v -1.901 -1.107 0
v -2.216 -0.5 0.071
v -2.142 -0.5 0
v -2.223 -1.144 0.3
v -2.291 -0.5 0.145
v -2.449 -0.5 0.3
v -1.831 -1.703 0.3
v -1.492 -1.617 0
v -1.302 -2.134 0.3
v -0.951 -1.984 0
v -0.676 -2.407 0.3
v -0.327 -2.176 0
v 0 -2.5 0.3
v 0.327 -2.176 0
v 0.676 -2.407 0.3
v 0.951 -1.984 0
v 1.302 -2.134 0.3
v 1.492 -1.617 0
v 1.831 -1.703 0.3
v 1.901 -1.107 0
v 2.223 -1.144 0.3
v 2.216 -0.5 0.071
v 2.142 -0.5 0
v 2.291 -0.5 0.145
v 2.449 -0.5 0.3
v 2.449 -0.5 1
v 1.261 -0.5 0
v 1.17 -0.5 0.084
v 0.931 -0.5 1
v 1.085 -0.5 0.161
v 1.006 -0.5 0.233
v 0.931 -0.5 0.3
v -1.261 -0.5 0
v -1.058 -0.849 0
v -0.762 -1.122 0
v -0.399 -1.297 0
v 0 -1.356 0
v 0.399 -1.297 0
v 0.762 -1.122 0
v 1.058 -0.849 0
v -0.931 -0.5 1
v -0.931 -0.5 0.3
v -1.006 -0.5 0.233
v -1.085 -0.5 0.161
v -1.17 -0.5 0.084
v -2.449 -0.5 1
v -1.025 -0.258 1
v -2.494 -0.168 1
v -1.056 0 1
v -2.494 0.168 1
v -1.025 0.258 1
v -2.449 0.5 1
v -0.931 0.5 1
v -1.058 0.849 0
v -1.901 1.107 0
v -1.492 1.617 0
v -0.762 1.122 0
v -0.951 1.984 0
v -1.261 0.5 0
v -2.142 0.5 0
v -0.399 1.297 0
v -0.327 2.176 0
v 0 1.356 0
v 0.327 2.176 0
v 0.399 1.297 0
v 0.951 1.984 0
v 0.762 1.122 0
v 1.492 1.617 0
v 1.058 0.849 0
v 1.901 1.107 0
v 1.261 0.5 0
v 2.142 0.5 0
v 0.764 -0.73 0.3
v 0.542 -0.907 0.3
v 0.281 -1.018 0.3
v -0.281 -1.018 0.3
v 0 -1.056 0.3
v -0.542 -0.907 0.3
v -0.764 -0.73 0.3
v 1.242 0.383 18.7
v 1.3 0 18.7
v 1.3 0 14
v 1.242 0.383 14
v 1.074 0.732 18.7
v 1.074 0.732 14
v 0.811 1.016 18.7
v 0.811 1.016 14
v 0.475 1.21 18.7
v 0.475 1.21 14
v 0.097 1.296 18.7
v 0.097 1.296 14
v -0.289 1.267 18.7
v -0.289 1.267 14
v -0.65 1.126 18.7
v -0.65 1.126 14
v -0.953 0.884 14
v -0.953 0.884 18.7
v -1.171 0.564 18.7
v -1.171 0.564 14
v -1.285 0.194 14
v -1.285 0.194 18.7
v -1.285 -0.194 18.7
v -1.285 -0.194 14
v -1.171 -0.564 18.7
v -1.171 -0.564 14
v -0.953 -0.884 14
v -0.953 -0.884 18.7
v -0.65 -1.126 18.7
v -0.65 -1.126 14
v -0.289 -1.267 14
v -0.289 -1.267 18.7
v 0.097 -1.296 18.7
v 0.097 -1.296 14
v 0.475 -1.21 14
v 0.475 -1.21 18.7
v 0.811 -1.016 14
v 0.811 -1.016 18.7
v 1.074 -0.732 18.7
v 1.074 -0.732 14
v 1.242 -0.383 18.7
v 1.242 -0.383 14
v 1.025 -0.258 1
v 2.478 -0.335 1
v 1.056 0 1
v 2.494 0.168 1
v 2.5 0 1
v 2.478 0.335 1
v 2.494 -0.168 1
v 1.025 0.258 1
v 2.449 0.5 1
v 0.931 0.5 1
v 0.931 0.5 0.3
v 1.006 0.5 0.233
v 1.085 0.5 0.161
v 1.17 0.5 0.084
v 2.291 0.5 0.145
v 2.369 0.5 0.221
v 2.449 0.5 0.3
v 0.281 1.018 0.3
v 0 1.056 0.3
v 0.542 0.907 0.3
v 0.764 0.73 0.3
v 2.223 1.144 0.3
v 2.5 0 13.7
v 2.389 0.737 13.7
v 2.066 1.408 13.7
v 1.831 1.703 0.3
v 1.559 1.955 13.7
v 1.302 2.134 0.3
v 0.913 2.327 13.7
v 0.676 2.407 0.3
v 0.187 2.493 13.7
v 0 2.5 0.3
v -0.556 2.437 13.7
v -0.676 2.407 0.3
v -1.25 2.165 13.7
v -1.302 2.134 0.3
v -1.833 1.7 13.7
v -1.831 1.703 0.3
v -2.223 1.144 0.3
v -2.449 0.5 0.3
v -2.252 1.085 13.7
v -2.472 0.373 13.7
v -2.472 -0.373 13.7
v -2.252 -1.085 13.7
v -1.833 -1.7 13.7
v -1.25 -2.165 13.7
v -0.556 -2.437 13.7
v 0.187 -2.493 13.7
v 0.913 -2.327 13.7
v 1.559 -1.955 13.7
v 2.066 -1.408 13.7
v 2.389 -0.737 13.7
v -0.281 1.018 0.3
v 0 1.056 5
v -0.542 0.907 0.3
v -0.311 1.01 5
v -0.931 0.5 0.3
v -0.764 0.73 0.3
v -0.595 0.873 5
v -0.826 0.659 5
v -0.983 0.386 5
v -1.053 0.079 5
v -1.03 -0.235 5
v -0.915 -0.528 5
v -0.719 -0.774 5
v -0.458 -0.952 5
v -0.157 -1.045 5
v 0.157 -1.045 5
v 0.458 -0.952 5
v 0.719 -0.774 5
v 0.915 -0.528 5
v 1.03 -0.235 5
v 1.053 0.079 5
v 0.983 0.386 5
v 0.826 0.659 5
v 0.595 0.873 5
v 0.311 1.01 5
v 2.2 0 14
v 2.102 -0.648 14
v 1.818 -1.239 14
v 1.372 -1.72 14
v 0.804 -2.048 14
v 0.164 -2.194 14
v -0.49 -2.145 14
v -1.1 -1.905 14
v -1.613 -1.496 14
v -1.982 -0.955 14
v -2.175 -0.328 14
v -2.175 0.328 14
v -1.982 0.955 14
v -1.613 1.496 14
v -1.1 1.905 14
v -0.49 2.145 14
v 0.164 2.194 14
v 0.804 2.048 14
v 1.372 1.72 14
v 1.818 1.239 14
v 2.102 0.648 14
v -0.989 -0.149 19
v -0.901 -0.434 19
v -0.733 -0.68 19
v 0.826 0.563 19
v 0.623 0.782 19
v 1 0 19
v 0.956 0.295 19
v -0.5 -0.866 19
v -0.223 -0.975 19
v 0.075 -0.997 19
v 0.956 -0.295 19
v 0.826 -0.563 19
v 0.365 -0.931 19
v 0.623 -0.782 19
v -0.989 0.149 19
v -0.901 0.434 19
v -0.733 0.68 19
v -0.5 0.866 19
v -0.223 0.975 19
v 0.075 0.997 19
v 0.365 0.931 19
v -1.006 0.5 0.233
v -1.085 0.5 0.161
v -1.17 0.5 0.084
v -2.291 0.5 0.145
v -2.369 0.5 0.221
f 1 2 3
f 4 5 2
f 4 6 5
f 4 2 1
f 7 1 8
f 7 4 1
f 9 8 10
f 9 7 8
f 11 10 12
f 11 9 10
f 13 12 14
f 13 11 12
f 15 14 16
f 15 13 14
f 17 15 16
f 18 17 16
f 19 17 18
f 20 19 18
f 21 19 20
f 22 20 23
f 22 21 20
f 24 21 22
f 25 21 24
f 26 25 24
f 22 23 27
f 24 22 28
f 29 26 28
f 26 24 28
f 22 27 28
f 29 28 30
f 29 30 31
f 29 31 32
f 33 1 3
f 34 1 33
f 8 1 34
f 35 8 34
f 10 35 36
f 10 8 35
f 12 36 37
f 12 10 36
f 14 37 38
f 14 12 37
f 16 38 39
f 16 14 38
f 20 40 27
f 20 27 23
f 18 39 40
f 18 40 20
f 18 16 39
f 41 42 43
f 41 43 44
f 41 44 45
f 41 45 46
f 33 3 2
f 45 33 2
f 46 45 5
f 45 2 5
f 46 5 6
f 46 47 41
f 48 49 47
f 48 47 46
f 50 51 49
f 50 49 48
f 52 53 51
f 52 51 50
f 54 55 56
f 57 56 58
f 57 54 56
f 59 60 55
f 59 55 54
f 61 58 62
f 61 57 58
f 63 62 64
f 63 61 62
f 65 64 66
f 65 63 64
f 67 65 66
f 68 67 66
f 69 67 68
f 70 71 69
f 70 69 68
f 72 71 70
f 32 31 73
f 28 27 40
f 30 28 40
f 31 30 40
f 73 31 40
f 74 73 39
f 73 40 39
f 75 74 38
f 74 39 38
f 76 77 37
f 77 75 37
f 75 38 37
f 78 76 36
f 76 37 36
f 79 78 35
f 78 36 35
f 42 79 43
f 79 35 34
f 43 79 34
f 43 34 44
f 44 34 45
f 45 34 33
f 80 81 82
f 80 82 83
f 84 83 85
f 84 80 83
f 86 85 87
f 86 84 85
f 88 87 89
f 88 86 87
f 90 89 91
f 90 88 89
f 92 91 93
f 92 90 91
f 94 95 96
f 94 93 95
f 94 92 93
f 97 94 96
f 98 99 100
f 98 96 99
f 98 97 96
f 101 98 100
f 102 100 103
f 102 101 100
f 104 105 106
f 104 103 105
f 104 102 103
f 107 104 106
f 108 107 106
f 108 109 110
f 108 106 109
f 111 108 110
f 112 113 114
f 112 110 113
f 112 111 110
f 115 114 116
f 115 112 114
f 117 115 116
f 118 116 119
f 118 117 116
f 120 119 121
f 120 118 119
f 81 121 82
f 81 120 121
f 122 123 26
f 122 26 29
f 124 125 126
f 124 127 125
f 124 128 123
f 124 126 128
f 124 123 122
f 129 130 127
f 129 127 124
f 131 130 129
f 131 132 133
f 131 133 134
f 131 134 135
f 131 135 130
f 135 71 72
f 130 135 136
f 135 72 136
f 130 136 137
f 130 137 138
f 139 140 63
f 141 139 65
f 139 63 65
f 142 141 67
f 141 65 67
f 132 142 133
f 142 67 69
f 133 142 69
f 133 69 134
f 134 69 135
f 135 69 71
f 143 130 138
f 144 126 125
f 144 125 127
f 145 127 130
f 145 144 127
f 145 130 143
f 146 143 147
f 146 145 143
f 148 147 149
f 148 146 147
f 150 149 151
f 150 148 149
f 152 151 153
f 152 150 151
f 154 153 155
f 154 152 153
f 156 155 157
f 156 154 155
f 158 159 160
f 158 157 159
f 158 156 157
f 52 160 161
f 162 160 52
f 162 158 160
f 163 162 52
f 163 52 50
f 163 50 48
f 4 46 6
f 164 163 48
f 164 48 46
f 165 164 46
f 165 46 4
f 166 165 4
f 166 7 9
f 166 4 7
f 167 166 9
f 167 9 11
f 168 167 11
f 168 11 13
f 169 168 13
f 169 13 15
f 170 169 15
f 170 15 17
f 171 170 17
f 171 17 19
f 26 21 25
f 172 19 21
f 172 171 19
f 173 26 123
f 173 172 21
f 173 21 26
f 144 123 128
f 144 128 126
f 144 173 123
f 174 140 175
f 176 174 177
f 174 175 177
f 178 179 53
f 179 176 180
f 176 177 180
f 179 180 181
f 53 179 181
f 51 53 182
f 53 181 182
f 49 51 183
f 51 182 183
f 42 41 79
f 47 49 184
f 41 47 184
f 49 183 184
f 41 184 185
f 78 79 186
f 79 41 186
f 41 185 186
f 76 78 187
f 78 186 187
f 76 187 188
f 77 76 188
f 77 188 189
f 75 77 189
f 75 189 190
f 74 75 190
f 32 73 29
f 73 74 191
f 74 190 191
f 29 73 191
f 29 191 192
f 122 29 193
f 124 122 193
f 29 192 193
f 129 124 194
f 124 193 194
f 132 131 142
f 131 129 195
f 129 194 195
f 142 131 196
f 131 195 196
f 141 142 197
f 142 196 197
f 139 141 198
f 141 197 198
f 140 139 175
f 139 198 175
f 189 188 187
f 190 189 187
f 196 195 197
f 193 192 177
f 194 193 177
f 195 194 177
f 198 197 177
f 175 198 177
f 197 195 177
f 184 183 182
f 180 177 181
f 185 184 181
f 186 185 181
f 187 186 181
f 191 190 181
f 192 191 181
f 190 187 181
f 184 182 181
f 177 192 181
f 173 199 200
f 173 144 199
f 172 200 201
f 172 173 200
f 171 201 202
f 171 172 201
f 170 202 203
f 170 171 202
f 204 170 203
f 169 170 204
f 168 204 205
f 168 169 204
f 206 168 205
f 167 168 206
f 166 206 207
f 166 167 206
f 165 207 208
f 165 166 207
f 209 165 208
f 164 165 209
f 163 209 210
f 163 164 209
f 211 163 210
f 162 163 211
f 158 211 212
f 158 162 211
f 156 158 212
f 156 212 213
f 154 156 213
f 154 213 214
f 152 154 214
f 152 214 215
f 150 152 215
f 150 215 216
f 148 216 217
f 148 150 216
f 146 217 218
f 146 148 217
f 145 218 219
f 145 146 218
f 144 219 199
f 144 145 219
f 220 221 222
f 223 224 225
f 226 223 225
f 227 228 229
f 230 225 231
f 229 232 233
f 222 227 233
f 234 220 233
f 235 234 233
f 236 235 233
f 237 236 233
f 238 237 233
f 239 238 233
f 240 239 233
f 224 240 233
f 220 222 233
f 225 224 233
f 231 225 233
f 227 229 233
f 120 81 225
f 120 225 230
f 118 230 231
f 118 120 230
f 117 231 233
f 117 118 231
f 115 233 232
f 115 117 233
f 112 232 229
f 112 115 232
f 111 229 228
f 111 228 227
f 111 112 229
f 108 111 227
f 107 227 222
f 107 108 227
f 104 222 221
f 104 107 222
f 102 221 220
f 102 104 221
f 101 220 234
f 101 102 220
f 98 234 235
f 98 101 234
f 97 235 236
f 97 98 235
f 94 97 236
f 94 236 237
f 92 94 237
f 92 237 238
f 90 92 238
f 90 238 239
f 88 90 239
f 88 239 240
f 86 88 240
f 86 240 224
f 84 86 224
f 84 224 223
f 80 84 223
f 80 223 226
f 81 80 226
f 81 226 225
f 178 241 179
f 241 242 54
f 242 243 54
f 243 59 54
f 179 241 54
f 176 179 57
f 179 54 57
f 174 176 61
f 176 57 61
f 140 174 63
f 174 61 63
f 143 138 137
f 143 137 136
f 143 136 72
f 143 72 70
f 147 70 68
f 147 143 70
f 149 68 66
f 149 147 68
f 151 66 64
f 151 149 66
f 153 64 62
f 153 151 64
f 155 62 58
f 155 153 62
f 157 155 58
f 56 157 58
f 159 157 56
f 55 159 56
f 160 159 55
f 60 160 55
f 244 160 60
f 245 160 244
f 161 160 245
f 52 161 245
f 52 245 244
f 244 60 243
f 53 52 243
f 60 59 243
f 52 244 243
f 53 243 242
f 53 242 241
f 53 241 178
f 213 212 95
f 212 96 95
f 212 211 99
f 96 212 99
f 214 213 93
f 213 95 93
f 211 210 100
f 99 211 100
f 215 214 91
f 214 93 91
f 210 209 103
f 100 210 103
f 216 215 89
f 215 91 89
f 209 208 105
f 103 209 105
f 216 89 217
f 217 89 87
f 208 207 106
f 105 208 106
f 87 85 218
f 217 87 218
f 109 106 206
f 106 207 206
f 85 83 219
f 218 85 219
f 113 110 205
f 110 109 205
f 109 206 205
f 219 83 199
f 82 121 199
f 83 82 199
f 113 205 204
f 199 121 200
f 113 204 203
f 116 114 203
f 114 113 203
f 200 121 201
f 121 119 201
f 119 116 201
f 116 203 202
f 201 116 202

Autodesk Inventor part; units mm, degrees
ref_plane "YZ Plane" through (0, 0, 0) normal (1, 0, 0) x (0, 1, 0)
ref_plane "XZ Plane" through (0, 0, 0) normal (0, 1, 0) x (-1, 0, 0)
ref_plane "XY Plane" through (0, 0, 0) normal (0, 0, 1) x (1, 0, 0)
sketch "Sketch1" plane through (0, 0, 0) normal (0, 1, 0) x (-1, 0, 0)
  line L0 (0, 0) -> (-2.5, 0)
  line L1 (-2.5, 0) -> (-2.5, 14)
  line L2 (-2.5, 14) -> (-1.3, 14)
  line L3 (-1.3, 14) -> (-1.3, 19)
  line L4 (-1.3, 19) -> (0, 19)
  line L5 (0, 19) -> (0, 0)
  dimension "d1" = 5
  dimension "d2" = 14
  dimension "d3" = 2.6
  dimension "d4" = 5
revolve "Revolution1" add sketch "Sketch1" angle 360 about axis through (0, 0, 19) along (0, 0, -1)
sketch "Sketch2" plane through (0, 0, 0) normal (0, 0, -1) x (-1, 0, 0)
  line L0 (-2.5, -0.5) -> (2.5, -0.5)
  line L1 (2.5, -0.5) -> (2.5, 0.5)
  line L2 (2.5, 0.5) -> (-2.5, 0.5)
  line L3 (-2.5, 0.5) -> (-2.5, -0.5)
  line L4 (-2.5, -0.5) -> (2.5, 0.5) construction
  line L5 (2.5, -0.5) -> (-2.5, 0.5) construction
  circle A0 centre (0, 0) radius 2.5 projected
  dimension "d6" = 1
extrude "Extrusion1" cut sketch "Sketch2" against normal blind 1 contours L3 A0 L0 | A0 L2 L0 | L3 L2 A0 | A0 L1 L0 | A0 L2 L1
hole "Hole1" at (0, 0, 0) direction (0, 0, 1) diameter 2.1129 depth 5 thread size "M2.6x0.45" class "6H" standard "ANSI Metric M Profile"
thread "Thread1" size "M2.6x0.45" class "6g" standard "ANSI Metric M Profile" full length
chamfer "Chamfer1" distance 0.3 angle 45 7 edges at (-2.5, 0, 14) (0, 2.5, 0) (0, -2.5, 0) (0, -1.0564, 0) (-0.5421, 0.9067, 0) (0.5421, 0.9067, 0) (-1.3, 0, 19)
properties part number "BRU-2614S" material "Stainless Steel AISI 304"
